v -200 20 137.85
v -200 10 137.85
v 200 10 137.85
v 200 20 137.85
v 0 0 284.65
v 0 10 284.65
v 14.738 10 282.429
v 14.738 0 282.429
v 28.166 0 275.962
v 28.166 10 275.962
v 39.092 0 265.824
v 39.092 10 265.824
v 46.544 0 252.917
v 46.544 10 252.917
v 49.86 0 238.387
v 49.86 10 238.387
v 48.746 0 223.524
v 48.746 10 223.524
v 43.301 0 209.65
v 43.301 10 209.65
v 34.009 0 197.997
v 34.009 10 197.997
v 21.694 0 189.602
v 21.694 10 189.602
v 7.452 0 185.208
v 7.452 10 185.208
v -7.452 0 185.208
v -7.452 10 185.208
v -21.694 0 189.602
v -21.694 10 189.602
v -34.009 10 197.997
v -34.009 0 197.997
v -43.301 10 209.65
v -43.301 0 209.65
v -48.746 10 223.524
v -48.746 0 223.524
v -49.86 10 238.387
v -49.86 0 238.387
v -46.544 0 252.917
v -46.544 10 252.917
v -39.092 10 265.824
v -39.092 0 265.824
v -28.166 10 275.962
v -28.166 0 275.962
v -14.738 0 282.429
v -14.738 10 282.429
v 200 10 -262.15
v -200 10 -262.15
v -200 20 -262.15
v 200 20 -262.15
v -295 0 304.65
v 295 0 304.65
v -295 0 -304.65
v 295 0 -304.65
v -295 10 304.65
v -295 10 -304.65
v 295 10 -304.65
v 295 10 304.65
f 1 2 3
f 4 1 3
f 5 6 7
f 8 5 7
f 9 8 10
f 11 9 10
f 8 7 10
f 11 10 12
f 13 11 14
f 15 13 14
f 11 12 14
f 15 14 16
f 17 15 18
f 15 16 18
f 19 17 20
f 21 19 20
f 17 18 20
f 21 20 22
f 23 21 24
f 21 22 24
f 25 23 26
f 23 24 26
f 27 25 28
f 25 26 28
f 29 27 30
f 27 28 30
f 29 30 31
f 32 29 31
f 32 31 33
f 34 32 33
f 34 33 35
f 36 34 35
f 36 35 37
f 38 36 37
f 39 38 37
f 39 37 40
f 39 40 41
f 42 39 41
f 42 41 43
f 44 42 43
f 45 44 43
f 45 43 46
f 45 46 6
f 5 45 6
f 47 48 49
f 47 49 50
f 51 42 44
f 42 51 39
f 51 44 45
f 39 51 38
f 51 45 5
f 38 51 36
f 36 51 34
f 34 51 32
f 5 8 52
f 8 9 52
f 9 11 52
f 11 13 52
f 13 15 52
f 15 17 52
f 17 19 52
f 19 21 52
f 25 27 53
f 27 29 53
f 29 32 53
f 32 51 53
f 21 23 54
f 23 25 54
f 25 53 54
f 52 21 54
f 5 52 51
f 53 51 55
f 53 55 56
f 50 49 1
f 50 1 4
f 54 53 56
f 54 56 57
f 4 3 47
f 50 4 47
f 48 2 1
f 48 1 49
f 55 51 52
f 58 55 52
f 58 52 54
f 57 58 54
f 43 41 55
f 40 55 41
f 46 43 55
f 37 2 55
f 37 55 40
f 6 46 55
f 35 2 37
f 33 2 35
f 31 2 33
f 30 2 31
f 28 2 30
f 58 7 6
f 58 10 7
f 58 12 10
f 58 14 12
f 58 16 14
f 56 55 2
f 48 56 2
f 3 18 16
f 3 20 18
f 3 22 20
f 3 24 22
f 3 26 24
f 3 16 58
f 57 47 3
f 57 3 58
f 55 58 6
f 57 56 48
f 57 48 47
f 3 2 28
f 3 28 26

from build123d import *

# Parameters (mm, degrees)
SKETCH1_W           = 590
SKETCH1_H           = 609.3
BOSS_EXTRUDE1_DEPTH = 10
SKETCH2_R           = 50
CUT_EXTRUDE3_DEPTH  = 425.189371036
SKETCH3_W           = 400
SKETCH3_H           = 400
BOSS_EXTRUDE6_DEPTH = 10


with BuildPart() as part:
    # Sketch1 → Boss-Extrude1 (new body)
    with BuildSketch(Plane(origin=(0, 0, 0), x_dir=(1, 0, 0), z_dir=(0, 1, 0))):
        Rectangle(SKETCH1_W, SKETCH1_H)
    extrude(amount=BOSS_EXTRUDE1_DEPTH)

    # Sketch2 → Cut-Extrude3 (cut, through all)
    with BuildSketch(Plane(origin=(0, 10, 0), x_dir=(1, 0, 0), z_dir=(0, 1, 0))):
        with Locations(Location((0, -234.65, 0), (0, 0, 270))):
            Circle(SKETCH2_R)
    extrude(amount=-CUT_EXTRUDE3_DEPTH, mode=Mode.SUBTRACT)

    # Sketch3 → Boss-Extrude6 (add)
    with BuildSketch(Plane(origin=(0, 10, -62.246477908), x_dir=(1, 0, 0), z_dir=(0, 1, 0))):
        with Locations((0, -0.096477908)):
            Rectangle(SKETCH3_W, SKETCH3_H)
    extrude(amount=BOSS_EXTRUDE6_DEPTH)


solid = part.part
